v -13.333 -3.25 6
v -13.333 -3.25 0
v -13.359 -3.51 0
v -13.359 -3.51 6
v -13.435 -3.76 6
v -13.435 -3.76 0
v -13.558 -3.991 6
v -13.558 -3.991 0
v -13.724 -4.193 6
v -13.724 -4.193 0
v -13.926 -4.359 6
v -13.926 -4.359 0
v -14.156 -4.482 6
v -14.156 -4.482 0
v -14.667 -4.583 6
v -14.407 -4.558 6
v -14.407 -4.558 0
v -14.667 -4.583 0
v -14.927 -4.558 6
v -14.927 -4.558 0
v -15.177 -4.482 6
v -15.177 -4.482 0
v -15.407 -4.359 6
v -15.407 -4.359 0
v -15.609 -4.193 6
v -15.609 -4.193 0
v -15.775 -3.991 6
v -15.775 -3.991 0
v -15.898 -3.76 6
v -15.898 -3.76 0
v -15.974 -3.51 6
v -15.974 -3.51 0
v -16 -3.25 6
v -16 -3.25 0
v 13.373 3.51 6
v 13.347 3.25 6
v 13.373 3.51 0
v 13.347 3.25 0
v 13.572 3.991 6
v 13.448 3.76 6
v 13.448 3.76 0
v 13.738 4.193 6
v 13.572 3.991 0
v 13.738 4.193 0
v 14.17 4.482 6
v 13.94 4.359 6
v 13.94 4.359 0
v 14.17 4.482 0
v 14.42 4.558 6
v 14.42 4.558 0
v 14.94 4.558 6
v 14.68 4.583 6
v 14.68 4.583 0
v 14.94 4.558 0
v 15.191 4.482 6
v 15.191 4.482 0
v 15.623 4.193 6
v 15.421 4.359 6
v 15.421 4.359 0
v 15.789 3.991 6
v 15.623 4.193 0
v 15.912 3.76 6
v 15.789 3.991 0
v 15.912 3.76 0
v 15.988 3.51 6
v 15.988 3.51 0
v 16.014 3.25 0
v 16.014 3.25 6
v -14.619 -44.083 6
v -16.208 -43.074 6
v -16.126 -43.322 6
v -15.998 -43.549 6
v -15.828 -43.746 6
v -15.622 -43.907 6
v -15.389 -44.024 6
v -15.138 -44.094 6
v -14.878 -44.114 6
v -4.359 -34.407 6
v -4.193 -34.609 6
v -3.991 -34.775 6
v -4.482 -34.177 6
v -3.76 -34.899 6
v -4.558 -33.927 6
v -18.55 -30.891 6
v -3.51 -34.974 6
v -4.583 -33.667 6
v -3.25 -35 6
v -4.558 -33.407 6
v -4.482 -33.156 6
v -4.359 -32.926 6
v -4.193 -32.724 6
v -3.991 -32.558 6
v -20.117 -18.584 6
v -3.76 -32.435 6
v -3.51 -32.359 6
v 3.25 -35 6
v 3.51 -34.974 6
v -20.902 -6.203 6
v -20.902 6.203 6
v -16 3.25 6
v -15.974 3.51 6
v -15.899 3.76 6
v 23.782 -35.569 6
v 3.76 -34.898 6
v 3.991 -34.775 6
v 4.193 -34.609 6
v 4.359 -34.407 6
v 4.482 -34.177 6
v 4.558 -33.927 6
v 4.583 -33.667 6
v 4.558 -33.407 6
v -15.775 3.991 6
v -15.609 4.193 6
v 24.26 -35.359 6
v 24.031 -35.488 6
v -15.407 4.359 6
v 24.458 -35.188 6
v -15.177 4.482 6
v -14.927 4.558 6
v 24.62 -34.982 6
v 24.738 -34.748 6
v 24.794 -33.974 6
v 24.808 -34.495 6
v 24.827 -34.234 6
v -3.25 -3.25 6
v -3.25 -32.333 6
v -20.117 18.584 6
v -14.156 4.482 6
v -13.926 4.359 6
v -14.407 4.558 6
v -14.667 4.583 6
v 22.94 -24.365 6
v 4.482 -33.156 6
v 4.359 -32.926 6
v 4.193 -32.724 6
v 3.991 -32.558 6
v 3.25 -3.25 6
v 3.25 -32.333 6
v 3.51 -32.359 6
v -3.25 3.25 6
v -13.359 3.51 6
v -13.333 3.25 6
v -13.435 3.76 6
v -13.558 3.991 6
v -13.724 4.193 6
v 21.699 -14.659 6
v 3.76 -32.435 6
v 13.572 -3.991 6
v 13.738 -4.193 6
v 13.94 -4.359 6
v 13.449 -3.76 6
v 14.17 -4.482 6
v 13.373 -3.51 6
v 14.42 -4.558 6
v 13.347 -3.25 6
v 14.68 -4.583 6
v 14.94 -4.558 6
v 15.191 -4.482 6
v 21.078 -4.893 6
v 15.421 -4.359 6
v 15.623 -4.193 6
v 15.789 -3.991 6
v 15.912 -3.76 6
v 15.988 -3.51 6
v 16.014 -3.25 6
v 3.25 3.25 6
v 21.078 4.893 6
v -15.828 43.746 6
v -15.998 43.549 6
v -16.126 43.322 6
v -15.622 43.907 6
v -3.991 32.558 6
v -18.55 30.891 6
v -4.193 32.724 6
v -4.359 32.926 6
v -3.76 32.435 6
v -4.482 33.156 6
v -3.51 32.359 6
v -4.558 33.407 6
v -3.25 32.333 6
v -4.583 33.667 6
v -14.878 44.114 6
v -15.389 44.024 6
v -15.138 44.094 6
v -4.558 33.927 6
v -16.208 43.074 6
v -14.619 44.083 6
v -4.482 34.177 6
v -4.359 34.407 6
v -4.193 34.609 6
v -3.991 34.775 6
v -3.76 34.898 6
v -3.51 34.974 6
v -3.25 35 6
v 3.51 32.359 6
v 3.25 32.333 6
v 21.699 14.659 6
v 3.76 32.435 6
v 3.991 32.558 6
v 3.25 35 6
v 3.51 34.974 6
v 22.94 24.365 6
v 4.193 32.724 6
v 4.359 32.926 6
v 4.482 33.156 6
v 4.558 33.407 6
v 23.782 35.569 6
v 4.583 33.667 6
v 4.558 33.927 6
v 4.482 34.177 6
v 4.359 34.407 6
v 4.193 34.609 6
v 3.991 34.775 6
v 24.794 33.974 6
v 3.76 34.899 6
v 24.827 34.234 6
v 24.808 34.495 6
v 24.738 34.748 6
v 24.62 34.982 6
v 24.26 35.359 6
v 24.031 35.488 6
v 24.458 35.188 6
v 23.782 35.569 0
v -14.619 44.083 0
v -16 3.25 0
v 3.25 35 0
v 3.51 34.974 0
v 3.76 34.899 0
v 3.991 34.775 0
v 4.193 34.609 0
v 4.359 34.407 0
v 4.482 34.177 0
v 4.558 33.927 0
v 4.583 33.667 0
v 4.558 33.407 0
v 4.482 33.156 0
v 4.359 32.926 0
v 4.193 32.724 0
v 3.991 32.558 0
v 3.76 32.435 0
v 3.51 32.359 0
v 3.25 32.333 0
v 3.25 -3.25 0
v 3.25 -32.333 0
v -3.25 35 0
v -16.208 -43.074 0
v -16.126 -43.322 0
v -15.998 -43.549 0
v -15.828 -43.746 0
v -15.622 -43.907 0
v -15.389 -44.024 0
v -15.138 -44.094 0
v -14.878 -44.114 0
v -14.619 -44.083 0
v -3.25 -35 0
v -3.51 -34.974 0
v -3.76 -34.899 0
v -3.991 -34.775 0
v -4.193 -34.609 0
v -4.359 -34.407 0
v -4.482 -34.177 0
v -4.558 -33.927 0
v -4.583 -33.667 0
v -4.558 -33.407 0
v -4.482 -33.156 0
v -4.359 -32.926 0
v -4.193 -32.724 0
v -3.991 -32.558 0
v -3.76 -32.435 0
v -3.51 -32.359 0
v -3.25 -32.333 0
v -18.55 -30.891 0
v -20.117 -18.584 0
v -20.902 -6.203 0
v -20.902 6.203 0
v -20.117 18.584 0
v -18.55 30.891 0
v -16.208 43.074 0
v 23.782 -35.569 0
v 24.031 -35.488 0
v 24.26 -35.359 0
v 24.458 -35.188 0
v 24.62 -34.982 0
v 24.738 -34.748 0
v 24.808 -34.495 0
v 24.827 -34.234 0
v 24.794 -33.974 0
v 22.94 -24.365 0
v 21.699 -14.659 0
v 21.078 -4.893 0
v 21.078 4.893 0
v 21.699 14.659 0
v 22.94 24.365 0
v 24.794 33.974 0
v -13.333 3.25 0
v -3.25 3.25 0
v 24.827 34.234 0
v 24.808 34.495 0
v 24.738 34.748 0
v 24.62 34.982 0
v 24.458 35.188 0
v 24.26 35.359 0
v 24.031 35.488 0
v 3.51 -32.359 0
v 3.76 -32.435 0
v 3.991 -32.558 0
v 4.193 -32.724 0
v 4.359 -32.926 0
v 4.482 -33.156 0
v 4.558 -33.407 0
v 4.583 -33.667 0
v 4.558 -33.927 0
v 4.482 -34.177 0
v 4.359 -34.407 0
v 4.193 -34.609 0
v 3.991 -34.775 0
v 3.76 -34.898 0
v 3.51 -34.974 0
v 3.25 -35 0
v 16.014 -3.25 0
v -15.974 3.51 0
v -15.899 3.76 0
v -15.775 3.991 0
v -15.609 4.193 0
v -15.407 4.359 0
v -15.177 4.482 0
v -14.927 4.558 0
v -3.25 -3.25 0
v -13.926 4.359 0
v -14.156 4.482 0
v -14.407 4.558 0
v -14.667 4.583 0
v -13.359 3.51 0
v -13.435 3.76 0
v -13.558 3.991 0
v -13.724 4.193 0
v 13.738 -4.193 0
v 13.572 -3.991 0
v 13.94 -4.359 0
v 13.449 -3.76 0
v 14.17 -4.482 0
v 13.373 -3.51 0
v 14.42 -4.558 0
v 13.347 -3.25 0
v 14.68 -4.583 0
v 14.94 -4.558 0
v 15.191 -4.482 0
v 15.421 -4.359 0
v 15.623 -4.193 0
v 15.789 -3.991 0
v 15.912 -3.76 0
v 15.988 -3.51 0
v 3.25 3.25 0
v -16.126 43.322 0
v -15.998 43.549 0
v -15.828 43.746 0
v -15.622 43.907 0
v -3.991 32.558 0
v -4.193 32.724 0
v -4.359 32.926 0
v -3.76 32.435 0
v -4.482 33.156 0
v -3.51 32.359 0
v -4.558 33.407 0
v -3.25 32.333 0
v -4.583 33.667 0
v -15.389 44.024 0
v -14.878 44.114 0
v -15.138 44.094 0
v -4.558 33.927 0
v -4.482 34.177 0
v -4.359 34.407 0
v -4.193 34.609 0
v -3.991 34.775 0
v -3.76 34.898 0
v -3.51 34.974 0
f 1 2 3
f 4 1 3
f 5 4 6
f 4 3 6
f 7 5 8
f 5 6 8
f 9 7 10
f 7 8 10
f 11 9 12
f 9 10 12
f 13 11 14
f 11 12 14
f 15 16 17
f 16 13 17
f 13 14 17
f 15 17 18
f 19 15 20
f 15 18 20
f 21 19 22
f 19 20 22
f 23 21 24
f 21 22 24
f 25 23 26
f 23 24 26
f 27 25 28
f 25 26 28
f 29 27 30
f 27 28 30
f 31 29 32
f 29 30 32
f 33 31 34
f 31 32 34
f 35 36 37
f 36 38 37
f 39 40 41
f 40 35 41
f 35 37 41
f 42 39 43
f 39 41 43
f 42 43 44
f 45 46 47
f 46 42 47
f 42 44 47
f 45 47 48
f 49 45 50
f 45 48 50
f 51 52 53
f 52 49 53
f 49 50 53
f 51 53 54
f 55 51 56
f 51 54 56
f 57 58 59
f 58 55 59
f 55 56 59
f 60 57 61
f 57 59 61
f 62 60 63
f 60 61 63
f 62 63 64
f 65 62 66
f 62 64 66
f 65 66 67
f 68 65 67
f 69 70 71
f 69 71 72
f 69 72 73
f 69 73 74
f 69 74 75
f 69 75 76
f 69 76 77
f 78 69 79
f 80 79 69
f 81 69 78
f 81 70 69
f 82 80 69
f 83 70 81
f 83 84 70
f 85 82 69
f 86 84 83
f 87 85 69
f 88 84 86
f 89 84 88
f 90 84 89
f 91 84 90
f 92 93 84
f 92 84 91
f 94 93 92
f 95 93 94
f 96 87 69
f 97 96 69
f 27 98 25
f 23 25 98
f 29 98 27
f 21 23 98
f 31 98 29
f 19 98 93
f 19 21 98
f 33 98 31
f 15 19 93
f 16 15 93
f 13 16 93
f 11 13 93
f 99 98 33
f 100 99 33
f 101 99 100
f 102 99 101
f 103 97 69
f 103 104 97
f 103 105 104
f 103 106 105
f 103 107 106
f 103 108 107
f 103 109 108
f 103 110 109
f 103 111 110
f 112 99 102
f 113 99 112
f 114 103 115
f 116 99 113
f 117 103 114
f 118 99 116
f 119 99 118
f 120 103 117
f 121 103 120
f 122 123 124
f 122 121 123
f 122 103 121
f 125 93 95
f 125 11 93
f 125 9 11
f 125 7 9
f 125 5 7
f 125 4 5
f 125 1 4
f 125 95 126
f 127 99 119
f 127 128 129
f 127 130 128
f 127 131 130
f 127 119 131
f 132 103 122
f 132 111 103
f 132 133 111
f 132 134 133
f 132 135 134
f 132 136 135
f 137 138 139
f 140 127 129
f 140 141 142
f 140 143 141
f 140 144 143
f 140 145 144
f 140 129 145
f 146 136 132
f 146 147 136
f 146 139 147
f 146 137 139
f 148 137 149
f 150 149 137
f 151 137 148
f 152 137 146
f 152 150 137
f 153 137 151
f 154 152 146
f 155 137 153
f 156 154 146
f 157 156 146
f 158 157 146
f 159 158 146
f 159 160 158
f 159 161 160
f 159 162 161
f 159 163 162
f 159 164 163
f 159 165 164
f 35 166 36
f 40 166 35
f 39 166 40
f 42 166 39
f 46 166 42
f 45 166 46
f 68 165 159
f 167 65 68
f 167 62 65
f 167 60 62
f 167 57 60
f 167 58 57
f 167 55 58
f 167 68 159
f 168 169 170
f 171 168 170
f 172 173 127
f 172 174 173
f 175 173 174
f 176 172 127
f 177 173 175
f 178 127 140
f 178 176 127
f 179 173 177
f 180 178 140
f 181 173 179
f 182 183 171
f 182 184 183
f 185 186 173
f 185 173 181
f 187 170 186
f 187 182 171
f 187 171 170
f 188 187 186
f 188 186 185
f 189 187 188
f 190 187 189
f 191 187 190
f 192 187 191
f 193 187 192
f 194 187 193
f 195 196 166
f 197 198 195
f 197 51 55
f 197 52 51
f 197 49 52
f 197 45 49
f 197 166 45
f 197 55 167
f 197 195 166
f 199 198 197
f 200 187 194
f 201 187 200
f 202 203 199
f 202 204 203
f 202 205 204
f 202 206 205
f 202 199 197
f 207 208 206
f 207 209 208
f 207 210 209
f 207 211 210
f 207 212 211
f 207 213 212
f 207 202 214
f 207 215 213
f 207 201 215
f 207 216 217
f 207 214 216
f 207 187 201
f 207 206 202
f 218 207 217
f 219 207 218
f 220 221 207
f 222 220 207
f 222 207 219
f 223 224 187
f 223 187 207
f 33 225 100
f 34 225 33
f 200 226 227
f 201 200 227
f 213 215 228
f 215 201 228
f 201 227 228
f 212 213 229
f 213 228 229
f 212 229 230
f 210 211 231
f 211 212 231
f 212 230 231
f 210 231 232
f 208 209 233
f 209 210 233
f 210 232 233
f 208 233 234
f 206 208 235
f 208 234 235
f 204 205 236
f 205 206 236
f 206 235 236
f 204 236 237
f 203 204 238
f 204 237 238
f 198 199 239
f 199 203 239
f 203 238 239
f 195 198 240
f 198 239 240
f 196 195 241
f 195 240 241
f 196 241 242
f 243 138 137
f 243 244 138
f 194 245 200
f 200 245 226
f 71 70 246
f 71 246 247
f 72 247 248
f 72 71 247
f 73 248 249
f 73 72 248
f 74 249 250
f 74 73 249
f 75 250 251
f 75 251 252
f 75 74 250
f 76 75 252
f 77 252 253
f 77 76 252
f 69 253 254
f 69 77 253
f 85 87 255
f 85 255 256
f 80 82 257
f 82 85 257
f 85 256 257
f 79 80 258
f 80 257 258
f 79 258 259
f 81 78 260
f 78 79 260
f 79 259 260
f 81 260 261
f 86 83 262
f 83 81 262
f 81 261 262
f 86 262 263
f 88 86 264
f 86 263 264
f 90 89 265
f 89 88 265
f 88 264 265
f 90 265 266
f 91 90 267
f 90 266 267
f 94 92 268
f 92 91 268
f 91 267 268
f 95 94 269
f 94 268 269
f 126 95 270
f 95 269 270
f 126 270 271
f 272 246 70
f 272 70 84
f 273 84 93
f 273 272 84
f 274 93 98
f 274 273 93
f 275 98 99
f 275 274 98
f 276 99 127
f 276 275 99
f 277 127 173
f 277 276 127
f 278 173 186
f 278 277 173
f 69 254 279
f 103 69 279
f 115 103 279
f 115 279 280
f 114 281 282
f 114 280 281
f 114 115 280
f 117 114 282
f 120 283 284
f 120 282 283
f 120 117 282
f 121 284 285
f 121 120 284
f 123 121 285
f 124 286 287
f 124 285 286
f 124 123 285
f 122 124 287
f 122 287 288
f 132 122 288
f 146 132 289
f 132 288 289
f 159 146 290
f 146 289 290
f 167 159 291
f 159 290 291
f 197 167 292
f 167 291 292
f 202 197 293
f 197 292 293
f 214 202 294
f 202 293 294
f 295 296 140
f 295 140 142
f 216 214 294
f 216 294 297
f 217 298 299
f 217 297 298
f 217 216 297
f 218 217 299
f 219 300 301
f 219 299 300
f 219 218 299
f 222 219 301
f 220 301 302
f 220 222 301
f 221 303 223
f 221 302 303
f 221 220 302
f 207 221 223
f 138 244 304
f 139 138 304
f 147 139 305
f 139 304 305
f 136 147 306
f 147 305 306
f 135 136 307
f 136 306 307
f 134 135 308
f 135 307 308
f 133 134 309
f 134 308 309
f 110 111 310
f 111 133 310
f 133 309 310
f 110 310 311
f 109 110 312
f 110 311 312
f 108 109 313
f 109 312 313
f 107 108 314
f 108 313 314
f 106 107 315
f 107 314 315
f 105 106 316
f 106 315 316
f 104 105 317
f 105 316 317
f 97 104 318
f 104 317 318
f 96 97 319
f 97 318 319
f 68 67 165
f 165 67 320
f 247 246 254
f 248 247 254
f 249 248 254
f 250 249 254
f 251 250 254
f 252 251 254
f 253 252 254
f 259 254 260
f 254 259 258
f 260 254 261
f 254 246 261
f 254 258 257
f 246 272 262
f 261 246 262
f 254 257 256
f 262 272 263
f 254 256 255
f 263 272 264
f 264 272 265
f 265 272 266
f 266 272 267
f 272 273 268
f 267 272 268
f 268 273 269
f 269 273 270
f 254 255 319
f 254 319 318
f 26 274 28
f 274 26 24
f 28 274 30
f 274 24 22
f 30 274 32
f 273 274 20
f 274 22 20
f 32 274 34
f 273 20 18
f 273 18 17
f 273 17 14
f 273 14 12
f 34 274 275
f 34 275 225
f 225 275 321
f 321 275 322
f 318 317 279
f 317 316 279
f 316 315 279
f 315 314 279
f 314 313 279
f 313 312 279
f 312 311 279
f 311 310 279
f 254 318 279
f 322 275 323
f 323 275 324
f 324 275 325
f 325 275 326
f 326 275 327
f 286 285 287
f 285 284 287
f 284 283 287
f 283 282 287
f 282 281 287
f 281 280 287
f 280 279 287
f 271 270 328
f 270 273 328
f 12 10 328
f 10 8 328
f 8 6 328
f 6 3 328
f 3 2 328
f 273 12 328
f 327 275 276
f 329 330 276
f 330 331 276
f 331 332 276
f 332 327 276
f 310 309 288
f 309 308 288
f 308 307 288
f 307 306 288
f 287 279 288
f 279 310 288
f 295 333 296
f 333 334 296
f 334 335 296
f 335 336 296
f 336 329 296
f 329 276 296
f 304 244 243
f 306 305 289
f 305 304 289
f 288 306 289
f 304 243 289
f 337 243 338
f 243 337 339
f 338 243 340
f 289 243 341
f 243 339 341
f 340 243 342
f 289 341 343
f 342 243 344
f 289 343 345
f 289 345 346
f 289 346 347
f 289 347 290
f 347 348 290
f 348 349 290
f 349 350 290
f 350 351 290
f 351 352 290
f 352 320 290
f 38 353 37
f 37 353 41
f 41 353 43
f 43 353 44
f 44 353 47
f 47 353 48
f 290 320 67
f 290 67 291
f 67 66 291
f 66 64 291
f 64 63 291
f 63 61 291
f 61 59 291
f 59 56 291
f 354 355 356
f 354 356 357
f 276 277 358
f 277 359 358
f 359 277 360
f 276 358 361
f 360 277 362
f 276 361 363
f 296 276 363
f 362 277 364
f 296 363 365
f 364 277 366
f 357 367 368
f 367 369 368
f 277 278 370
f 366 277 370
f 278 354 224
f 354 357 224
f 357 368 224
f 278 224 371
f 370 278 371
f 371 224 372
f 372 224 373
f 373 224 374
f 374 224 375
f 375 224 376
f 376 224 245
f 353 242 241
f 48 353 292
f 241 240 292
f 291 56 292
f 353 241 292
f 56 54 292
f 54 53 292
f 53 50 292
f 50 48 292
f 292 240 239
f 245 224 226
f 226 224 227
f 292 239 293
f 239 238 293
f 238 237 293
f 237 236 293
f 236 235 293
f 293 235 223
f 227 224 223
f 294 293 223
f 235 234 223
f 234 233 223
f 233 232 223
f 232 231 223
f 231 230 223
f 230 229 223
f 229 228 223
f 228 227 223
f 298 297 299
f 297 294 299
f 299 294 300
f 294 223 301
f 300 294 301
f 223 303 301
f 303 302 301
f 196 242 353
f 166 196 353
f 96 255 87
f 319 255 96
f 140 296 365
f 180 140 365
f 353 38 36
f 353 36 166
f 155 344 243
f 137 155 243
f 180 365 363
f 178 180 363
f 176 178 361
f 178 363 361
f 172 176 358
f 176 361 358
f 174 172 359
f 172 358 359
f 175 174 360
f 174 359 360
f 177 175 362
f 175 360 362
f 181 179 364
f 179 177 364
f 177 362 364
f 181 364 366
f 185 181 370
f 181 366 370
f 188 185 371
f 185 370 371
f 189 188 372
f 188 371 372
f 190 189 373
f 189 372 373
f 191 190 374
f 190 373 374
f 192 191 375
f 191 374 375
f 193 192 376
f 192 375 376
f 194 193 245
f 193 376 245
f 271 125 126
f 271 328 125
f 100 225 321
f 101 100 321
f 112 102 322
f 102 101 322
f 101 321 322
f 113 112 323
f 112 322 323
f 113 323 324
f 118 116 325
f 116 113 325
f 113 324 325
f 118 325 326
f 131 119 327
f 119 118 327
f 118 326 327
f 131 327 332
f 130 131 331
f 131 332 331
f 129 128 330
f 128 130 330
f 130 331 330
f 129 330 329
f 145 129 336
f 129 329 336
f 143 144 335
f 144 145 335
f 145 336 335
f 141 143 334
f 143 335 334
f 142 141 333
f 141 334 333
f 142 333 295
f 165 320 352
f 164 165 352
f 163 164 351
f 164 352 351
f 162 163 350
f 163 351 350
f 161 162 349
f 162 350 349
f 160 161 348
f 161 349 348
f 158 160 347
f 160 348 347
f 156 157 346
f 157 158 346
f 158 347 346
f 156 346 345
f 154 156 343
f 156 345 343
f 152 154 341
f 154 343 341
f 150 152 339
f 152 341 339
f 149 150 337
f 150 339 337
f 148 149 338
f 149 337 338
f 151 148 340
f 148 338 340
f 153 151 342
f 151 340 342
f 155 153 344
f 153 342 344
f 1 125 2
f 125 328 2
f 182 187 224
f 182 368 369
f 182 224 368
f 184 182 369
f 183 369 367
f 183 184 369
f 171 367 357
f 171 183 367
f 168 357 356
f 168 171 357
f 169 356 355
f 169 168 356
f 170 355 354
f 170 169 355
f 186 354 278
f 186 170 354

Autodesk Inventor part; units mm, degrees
ref_plane "YZ Plane" through (0, 0, 0) normal (1, 0, 0) x (0, 1, 0)
ref_plane "XZ Plane" through (0, 0, 0) normal (0, 1, 0) x (-1, 0, 0)
ref_plane "XY Plane" through (0, 0, 0) normal (0, 0, 1) x (1, 0, 0)
sketch "Sketch1" plane through (0, 0, 0) normal (0, 0, 1) x (1, 0, 0)
  line L0 (-3.25, 35) -> (3.25, 35)
  arc A0 (-13.3333, 3.25) -> (-16, 3.25) centre (-14.6667, 3.25) ccw
  arc A1 (16.0137, 3.25) -> (13.347, 3.25) centre (14.6803, 3.25) ccw
  arc A2 (-3.25, 35) -> (-3.25, 32.3333) centre (-3.25, 33.6667) ccw
  arc A3 (3.25, 32.3333) -> (3.25, 35) centre (3.25, 33.6667) ccw
  line L1 (3.25, 32.3333) -> (3.25, 3.25)
  line L2 (-3.25, 3.25) -> (-3.25, 32.3333)
  line L3 (13.347, 3.25) -> (3.25, 3.25)
  line L4 (-3.25, 3.25) -> (-13.3333, 3.25)
  line L5 (-15.9119, 44.3695) -> (25.0953, 35.2784)
  line L6 (-15.9119, -44.3695) -> (25.0953, -35.2784)
  line L7 (107.2341, 51.0746) -> (107.2341, -58.8764)
  arc A4 (-15.9119, 44.3695) -> (-15.9119, -44.3695) centre (175, 0) ccw
  arc A5 (25.0953, 35.2784) -> (25.0953, -35.2784) centre (175, 0) ccw
  line L8 (-24.8255, 0) -> (30.5939, 0)
  line L9 (-16, 3.25) -> (-16, 0)
  line L10 (16.0137, 3.25) -> (16.0137, 0)
  line L11 (-3.25, -35) -> (3.25, -35)
  arc A6 (-16, -3.25) -> (-13.3333, -3.25) centre (-14.6667, -3.25) ccw
  arc A7 (13.347, -3.25) -> (16.0137, -3.25) centre (14.6803, -3.25) ccw
  arc A8 (-3.25, -32.3333) -> (-3.25, -35) centre (-3.25, -33.6667) ccw
  arc A9 (3.25, -35) -> (3.25, -32.3333) centre (3.25, -33.6667) ccw
  line L12 (3.25, -32.3333) -> (3.25, -3.25)
  line L13 (-3.25, -3.25) -> (-3.25, -32.3333)
  line L14 (13.347, -3.25) -> (3.25, -3.25)
  line L15 (-3.25, -3.25) -> (-13.3333, -3.25)
  line L16 (-16, -3.25) -> (-16, 0)
  line L17 (16.0137, -3.25) -> (16.0137, 0)
  point P0 (0, 0)
  dimension "d3" = 1.3333
  dimension "d4" = 2.6667
  dimension "d14" = 2.6667
  dimension "d15" = 1.3333
  dimension "d26" = 392
  dimension "d30" = 5
  dimension "d38" = 0
  dimension "d40" = 10.097
  dimension "d41" = 0
  dimension "d42" = 3.25
  dimension "d43" = 0
extrude "Extrusion1" add sketch "Sketch1" along normal blind 6 contours A2 L2 L4 A0 L9 L8 A4 L5 A5 L10 A1 L3 L1 A3 L0 | L16 A6 L15 L13 A8 L11 A9 L12 L14 A7 L17 L8 A5 L6 A4
fillet "Fillet1" radius 1.3333 4 edges at (-15.9119, -44.3695, 3) (25.0953, -35.2784, 3) (25.0953, 35.2784, 3) (-15.9119, 44.3695, 3)
properties part number "Feet"
